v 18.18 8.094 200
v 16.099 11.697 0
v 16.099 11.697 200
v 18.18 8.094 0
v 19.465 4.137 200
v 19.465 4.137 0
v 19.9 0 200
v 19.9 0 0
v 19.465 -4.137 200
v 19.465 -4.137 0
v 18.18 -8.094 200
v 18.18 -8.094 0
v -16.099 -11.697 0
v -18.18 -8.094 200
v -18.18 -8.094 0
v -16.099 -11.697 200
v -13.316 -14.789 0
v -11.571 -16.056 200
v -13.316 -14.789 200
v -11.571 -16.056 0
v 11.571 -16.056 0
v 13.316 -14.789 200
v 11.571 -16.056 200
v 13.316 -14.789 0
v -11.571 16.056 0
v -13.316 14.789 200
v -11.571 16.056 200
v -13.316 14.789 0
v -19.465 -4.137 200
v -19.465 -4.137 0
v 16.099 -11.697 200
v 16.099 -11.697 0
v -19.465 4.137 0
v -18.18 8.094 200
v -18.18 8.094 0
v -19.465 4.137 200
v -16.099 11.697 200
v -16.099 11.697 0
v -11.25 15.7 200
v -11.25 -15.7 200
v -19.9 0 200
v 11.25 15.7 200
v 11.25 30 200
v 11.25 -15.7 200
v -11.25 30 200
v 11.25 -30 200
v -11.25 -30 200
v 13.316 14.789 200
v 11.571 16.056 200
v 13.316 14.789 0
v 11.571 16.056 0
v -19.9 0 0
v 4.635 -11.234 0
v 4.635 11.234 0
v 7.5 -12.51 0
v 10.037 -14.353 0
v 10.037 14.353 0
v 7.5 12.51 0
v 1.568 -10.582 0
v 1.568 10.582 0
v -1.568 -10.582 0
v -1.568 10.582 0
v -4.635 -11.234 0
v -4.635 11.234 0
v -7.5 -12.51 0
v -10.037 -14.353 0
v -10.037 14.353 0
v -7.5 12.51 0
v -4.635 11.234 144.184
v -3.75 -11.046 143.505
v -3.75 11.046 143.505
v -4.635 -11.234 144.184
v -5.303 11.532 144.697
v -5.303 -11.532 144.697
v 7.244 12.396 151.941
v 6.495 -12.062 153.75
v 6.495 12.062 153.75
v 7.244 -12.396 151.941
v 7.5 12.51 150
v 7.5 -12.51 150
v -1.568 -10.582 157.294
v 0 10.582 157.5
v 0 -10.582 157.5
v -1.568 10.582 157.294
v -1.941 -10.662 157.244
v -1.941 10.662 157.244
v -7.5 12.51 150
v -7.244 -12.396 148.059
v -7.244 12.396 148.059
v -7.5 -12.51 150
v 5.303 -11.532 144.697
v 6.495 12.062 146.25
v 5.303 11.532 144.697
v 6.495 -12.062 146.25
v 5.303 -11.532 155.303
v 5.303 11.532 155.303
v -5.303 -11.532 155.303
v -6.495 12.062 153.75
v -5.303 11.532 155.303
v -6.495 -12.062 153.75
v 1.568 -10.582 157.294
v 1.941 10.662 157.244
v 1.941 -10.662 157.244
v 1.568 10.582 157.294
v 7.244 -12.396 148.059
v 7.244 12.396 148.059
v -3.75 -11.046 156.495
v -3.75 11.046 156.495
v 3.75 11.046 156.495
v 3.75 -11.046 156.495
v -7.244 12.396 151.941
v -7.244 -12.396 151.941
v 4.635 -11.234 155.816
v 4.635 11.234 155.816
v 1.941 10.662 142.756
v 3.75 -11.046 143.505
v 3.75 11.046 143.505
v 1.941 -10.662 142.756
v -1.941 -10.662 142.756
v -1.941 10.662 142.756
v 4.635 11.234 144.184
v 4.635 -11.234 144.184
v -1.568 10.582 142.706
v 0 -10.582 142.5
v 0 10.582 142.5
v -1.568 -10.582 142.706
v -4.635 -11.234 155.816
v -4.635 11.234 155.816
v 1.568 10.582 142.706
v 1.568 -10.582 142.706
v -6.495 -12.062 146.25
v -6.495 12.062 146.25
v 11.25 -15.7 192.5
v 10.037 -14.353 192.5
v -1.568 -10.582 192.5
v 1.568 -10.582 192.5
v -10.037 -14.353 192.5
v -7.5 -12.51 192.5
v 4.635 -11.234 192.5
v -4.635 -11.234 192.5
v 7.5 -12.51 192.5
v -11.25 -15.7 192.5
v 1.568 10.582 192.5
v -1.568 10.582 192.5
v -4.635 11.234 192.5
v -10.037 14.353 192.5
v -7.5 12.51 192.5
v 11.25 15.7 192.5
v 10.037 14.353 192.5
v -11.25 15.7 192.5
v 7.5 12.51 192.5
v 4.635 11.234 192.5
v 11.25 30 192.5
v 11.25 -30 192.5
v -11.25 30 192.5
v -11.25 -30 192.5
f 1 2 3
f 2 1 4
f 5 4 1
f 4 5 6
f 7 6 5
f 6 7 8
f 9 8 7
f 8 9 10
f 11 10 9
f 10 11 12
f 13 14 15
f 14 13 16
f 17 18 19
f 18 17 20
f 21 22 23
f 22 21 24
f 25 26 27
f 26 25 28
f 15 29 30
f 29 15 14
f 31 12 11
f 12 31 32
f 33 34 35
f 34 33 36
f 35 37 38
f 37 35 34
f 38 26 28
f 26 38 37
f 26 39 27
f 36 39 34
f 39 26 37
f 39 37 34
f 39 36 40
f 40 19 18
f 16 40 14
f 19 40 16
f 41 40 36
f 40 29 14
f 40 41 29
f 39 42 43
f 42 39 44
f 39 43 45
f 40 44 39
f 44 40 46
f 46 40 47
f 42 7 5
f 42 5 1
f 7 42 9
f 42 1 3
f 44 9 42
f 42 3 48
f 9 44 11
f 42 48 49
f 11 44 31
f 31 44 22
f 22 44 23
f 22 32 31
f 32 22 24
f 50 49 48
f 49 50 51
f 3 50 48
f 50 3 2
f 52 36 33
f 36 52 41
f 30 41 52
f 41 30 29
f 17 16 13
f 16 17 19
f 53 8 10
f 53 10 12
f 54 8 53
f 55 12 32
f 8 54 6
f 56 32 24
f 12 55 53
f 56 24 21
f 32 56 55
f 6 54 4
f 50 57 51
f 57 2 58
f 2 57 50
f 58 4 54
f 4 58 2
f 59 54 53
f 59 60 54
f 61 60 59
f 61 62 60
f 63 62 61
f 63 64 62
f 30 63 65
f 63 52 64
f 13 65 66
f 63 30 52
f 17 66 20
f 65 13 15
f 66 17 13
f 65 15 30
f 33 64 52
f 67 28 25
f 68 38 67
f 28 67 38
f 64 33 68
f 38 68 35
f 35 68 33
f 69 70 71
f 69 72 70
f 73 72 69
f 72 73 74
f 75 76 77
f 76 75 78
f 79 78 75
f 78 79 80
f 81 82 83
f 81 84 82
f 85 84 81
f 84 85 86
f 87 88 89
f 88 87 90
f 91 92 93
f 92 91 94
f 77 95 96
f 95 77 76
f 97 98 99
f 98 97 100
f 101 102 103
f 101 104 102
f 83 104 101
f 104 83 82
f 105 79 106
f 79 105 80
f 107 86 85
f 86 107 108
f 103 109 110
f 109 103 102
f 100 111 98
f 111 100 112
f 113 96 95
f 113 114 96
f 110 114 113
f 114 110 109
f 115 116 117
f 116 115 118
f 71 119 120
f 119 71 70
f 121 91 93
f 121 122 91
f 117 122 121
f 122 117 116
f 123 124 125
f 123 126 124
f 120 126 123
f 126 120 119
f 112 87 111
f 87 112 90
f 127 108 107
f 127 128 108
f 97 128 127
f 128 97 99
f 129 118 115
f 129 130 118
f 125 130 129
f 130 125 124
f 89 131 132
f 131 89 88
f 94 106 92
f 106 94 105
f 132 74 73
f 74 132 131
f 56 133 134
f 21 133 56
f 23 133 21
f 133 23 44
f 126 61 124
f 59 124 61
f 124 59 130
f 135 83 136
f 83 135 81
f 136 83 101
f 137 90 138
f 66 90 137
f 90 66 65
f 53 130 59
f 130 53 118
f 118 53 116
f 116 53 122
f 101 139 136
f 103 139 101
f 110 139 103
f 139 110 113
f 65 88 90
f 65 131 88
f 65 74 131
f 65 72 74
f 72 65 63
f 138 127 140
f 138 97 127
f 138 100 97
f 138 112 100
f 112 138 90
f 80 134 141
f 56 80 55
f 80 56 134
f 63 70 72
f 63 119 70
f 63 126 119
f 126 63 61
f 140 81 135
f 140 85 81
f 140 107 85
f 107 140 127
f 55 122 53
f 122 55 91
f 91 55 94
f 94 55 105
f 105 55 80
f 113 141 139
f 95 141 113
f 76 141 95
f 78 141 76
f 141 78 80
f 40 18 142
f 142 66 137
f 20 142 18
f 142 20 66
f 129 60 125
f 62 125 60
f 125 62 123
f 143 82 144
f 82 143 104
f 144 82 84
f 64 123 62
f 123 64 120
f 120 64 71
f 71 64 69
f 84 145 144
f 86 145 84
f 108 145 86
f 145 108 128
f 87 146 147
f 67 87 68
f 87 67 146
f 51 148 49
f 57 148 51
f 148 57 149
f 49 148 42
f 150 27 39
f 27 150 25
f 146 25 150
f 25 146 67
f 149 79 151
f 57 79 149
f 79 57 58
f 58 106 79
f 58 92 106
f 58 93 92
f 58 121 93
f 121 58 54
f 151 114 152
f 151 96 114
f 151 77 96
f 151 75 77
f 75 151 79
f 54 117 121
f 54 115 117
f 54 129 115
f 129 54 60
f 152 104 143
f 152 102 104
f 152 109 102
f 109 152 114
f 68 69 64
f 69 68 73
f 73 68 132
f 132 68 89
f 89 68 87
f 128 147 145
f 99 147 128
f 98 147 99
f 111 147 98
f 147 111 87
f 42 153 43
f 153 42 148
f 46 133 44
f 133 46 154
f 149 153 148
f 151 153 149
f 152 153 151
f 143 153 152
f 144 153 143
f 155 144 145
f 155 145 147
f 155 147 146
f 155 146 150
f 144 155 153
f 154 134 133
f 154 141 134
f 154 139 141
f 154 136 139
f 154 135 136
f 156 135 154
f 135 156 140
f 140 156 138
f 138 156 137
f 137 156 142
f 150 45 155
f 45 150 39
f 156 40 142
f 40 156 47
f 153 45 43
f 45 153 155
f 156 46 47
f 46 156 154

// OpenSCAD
r = 30;
h = 200;
thickness = 10;

cubeLength = 2*r;
cubeWidth = .75*r;
cubeHeight = .25*r;


difference(){
    cylinder(h, r-thickness-.1, r-thickness-.1);
 
    translate([0, r, .75*h]){
        rotate([90, 0, 0]){
            cylinder(2*r, .25*r, .25*r);
        };
    };

    translate([0,-.85*r, 0]){
        cylinder(h, r/2, r/2);
    };
    
    translate([0,.85*r, 0]){
    cylinder(h, r/2, r/2);
    };
};

translate([-.5*cubeWidth, -.5*cubeLength, h-cubeHeight]){    
    cube([cubeWidth,cubeLength,cubeHeight]);    
};
